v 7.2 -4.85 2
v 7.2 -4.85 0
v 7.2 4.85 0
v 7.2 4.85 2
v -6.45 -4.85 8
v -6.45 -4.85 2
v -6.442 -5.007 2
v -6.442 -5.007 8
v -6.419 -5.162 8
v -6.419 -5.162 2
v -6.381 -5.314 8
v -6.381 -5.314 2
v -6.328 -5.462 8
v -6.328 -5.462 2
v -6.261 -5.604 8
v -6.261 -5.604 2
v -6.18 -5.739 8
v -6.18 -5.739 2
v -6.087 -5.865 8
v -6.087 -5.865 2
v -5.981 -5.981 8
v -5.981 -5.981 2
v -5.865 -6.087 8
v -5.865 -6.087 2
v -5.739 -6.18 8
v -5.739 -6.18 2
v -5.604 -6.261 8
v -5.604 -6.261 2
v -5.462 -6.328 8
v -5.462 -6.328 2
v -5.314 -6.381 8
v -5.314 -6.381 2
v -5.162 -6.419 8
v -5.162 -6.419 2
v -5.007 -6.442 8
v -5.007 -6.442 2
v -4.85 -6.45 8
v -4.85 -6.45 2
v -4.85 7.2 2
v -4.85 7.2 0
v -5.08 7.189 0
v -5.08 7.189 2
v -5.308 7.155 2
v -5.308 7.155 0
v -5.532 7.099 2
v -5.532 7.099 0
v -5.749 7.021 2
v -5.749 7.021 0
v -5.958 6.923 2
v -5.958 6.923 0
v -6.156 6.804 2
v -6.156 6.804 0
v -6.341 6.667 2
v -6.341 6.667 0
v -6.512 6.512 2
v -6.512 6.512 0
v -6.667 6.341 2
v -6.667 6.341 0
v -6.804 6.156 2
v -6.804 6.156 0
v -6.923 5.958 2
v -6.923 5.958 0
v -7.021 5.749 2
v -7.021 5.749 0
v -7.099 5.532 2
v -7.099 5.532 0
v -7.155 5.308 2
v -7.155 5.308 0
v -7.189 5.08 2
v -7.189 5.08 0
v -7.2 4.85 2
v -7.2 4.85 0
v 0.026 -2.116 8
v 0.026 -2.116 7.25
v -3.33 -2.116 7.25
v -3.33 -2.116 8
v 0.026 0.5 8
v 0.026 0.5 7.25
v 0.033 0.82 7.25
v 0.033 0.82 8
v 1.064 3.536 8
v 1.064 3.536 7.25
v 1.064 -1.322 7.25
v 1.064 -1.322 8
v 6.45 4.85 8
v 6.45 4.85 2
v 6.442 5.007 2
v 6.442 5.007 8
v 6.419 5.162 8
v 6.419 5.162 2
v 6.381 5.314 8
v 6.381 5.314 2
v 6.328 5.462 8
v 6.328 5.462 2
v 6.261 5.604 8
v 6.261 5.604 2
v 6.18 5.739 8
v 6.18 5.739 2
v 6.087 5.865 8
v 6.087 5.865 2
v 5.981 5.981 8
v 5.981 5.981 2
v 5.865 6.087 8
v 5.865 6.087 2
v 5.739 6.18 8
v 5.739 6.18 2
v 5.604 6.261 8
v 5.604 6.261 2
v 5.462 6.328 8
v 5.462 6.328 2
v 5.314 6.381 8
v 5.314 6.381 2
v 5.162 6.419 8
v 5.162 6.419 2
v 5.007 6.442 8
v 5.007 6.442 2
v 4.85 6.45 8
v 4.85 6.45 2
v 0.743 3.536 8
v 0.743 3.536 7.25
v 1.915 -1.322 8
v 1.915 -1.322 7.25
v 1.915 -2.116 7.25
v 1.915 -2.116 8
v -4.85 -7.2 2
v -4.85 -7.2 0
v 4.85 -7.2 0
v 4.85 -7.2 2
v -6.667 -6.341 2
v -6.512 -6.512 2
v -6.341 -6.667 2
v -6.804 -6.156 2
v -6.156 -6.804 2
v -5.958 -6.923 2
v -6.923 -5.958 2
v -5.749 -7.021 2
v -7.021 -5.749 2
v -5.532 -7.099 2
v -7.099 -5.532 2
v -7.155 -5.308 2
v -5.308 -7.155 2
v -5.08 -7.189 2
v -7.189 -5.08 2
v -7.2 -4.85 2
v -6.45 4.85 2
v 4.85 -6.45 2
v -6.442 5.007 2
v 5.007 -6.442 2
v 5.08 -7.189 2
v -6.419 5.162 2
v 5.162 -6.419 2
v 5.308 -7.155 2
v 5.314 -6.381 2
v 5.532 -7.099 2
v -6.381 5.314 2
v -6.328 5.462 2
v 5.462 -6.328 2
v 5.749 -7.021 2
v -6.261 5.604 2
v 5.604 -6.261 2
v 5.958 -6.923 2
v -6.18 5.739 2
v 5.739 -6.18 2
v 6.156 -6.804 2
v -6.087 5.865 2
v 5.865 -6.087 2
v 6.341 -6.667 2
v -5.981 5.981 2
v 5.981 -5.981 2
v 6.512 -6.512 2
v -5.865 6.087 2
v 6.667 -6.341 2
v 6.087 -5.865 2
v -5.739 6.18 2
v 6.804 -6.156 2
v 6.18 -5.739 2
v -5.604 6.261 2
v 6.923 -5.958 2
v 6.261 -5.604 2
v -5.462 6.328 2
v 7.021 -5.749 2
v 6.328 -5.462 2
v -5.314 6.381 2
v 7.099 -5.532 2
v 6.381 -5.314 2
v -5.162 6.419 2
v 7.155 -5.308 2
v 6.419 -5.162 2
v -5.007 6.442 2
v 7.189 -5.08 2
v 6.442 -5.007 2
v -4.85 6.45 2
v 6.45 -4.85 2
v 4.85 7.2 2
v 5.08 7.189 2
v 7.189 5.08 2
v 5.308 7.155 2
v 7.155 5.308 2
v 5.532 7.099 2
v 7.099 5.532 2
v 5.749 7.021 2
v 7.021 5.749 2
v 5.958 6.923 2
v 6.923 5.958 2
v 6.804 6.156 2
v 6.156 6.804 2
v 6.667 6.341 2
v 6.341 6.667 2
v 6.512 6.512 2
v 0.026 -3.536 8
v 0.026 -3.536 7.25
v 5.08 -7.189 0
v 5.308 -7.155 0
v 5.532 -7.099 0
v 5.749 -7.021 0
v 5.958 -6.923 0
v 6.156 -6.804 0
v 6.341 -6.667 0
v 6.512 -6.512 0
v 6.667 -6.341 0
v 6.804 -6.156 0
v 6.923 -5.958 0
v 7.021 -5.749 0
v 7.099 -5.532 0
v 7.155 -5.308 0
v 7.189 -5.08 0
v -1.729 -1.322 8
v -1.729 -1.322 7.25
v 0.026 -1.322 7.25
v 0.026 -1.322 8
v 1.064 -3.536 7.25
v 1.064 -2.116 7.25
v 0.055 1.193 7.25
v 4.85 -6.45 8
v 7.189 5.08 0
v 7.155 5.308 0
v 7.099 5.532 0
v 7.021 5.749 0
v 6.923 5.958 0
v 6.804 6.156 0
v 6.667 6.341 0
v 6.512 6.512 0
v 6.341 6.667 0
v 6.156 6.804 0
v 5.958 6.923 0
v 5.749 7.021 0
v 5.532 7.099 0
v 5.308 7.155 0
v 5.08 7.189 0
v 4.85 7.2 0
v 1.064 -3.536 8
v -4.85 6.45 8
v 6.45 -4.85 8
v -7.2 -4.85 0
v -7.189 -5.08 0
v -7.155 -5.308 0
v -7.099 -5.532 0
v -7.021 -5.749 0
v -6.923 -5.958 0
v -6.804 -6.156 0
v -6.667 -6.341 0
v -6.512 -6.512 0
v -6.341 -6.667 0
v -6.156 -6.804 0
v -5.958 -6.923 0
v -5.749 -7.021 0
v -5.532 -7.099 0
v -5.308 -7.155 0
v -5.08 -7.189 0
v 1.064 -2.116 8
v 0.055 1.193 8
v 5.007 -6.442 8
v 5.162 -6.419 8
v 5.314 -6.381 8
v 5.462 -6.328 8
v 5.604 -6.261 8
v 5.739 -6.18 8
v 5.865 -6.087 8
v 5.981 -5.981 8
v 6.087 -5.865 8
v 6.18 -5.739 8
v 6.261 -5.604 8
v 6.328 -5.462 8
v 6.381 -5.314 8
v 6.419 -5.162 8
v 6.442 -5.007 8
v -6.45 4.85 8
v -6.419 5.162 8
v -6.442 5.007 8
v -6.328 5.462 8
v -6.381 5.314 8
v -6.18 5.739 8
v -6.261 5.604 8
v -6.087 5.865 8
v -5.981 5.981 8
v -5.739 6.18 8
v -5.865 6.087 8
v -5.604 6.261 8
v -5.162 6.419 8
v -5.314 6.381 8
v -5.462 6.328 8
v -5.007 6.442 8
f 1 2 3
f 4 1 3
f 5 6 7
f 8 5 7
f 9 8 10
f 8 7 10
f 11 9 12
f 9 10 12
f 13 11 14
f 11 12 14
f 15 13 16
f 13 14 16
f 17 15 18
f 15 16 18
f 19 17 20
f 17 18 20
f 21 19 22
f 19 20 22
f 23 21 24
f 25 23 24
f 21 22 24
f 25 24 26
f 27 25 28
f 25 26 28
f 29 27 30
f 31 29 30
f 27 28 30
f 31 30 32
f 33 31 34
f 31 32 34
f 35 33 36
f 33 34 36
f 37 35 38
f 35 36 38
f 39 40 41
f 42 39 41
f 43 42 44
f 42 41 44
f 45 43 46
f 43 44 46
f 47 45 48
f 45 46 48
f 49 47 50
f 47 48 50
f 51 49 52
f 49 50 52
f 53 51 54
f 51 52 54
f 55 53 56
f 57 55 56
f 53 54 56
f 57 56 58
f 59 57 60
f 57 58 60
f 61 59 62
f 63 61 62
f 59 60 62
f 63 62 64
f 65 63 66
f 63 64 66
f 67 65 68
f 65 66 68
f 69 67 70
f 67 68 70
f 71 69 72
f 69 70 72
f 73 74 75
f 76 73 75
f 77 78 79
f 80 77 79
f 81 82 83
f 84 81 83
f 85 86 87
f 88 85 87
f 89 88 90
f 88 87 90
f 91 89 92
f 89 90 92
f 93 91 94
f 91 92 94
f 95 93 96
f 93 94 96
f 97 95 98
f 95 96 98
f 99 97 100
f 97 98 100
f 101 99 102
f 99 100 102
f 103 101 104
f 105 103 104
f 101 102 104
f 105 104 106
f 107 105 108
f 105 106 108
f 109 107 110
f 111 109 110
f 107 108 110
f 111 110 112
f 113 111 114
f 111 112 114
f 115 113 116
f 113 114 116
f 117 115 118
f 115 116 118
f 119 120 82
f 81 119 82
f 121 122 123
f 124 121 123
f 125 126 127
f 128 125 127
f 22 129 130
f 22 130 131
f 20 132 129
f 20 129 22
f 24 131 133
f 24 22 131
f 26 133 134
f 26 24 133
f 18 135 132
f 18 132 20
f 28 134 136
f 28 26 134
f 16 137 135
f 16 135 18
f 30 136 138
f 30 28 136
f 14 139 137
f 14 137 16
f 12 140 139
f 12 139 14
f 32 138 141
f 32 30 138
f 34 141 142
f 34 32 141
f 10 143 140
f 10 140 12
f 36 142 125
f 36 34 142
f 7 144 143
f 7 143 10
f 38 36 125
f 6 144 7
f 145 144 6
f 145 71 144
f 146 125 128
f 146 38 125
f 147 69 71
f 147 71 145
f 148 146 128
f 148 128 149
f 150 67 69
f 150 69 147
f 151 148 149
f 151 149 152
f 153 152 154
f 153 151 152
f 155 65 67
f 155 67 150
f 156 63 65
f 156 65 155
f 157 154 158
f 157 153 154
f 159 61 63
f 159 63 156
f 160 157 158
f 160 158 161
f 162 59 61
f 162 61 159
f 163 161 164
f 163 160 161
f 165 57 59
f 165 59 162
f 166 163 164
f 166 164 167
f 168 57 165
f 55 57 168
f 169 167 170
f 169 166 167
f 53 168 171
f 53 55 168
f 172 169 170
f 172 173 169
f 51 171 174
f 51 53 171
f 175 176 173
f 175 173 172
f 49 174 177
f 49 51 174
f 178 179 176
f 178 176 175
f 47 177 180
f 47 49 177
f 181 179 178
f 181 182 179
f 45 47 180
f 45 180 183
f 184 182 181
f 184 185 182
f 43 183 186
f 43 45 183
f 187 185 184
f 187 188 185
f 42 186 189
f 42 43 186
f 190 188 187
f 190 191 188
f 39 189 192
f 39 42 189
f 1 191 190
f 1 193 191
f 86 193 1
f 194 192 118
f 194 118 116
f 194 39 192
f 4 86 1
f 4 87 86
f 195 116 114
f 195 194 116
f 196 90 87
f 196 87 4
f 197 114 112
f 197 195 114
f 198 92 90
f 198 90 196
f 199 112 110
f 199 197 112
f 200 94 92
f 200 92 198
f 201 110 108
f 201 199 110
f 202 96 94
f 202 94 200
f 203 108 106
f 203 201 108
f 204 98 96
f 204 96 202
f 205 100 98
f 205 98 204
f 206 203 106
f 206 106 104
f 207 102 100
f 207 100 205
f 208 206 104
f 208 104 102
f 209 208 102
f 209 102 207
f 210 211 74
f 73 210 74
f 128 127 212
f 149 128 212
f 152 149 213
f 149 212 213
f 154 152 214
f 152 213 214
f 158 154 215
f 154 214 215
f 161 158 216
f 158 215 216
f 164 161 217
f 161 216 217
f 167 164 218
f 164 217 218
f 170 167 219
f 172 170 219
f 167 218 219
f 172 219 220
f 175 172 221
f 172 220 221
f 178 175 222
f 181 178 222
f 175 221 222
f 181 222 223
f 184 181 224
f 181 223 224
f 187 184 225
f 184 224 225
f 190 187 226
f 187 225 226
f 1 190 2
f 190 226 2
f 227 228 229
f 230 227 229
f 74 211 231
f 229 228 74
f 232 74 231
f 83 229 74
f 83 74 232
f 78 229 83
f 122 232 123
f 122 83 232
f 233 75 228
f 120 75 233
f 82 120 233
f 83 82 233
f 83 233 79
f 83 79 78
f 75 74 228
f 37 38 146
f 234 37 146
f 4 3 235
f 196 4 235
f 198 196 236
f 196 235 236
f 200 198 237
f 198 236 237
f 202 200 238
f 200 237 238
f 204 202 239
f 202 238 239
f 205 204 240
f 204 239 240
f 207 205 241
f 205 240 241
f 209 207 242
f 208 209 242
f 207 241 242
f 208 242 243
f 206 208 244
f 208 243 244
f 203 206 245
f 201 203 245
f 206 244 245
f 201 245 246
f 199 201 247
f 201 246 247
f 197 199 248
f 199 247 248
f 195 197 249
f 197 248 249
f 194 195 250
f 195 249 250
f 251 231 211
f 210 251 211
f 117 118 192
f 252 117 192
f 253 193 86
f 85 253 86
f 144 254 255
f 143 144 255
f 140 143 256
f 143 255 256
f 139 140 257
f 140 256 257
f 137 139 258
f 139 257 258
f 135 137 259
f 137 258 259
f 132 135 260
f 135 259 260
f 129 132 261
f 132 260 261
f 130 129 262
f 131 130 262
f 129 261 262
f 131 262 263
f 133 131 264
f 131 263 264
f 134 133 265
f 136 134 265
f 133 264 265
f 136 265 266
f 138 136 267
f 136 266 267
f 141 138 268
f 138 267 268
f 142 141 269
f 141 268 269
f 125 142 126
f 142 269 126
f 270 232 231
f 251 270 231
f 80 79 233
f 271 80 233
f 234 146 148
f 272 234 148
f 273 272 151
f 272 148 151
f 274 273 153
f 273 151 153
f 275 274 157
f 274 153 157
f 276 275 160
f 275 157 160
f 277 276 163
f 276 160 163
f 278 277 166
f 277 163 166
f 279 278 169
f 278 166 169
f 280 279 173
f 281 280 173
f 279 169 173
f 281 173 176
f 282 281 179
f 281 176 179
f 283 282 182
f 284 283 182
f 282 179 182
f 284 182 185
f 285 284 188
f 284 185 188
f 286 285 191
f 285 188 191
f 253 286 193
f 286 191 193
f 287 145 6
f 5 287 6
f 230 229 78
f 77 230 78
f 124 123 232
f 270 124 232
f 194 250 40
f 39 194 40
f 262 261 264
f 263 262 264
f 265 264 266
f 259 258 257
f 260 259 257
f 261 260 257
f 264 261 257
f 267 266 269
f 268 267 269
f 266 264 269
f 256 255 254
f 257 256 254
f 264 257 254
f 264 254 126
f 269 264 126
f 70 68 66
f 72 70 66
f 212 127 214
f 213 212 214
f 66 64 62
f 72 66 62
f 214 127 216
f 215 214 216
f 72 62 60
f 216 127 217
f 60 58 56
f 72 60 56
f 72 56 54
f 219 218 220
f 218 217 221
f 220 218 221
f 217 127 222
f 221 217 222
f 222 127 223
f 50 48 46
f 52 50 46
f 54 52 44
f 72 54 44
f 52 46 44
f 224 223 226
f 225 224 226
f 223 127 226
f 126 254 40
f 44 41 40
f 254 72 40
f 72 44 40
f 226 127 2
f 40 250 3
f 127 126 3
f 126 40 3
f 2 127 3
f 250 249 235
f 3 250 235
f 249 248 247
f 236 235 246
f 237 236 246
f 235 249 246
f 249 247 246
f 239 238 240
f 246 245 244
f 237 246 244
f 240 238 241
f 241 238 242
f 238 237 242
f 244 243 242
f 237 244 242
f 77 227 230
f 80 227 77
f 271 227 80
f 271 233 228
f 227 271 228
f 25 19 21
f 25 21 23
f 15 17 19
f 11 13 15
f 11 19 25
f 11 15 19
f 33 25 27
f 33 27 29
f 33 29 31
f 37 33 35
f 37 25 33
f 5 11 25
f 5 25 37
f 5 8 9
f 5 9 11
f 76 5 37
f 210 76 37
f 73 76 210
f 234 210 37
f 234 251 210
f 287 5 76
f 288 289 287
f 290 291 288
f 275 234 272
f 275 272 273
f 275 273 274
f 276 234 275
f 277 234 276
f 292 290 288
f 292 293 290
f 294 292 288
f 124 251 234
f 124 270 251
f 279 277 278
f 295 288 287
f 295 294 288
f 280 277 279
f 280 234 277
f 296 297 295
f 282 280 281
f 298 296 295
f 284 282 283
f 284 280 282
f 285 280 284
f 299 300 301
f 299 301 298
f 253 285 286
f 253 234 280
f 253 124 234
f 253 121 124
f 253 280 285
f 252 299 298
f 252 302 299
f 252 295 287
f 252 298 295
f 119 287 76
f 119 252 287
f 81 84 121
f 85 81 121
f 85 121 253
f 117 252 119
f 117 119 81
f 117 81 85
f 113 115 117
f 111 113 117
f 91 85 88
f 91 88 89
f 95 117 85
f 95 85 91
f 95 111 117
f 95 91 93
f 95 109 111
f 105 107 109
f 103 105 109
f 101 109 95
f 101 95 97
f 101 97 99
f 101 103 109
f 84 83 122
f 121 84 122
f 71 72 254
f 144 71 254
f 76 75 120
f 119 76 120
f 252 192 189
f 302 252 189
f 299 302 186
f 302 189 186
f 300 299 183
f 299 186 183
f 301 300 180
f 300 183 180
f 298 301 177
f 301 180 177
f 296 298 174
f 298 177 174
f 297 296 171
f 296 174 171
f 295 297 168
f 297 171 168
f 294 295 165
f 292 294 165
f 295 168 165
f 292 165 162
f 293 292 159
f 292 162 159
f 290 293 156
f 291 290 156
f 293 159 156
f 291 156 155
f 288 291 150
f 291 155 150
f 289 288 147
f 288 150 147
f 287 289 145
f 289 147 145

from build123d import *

# Parameters (mm, degrees)
F1_DEPTH = 2
F2_DEPTH = 8
F3_DEPTH = 8
F4_DEPTH = 7.25


with BuildPart() as f1:
    # F0 (on Top) → F1 (new body)
    with BuildSketch(Plane.XY):
        with BuildLine():
            Line((4.85, 7.2), (-4.85, 7.2))
            ThreePointArc((-4.85, 7.2), (-6.5117009358, 6.5117009358), (-7.2, 4.85))
            Line((-7.2, 4.85), (-7.2, -4.85))
            ThreePointArc((-7.2, -4.85), (-6.5117009358, -6.5117009358), (-4.85, -7.2))
            Line((-4.85, -7.2), (4.85, -7.2))
            ThreePointArc((4.85, -7.2), (6.5117009358, -6.5117009358), (7.2, -4.85))
            Line((7.2, -4.85), (7.2, 4.85))
            ThreePointArc((7.2, 4.85), (6.5117009358, 6.5117009358), (4.85, 7.2))
        make_face()
        with BuildLine():
            ThreePointArc((6.45, -4.85), (5.9813708499, -5.9813708499), (4.85, -6.45))
            Line((4.85, -6.45), (-4.85, -6.45))
            ThreePointArc((-4.85, -6.45), (-5.9813708499, -5.9813708499), (-6.45, -4.85))
            Line((-6.45, -4.85), (-6.45, 4.85))
            ThreePointArc((-6.45, 4.85), (-5.9813708499, 5.9813708499), (-4.85, 6.45))
            Line((-4.85, 6.45), (4.85, 6.45))
            ThreePointArc((4.85, 6.45), (5.9813708499, 5.9813708499), (6.45, 4.85))
            Line((6.45, 4.85), (6.45, -4.85))
        make_face(mode=Mode.SUBTRACT)
    extrude(amount=F1_DEPTH)

    # F0 (on Top) → F2 (join)
    with BuildSketch(Plane.XY):
        with BuildLine():
            Line((-4.85, -6.45), (4.85, -6.45))
            ThreePointArc((4.85, -6.45), (5.9813708499, -5.9813708499), (6.45, -4.85))
            Line((6.45, -4.85), (6.45, 4.85))
            ThreePointArc((6.45, 4.85), (5.9813708499, 5.9813708499), (4.85, 6.45))
            Line((4.85, 6.45), (-4.85, 6.45))
            ThreePointArc((-4.85, 6.45), (-5.9813708499, 5.9813708499), (-6.45, 4.85))
            Line((-6.45, 4.85), (-6.45, -4.85))
            ThreePointArc((-6.45, -4.85), (-5.9813708499, -5.9813708499), (-4.85, -6.45))
        make_face()
        Polygon((1.063809, -3.535861), (0.026241, -3.535861), (0.026241, -2.115779), (-3.330316, -2.115779), (0.743454, 3.535861), (1.063809, 3.535861), (1.063809, -1.322063), (1.914902, -1.322063), (1.914902, -2.115779), (1.063809, -2.115779), align=None, mode=Mode.SUBTRACT)
    extrude(amount=F2_DEPTH)



with BuildPart() as f3:
    # F0 (on Top) → F3 (new body)
    with BuildSketch(Plane.XY):
        Polygon((0.033413, 0.820014), (0.05493, 1.192964), (-1.72854, -1.322063), (0.026241, -1.322063), (0.026241, 0.499658), align=None)
    extrude(amount=F3_DEPTH)


with BuildPart() as f1_1:
    add(f1.part)

    add(f3.part)  # F4 merges F3
    # F0 (on Top) → F4 (join)
    with BuildSketch(Plane.XY):
        Polygon((0.026241, -2.115779), (0.026241, -3.535861), (1.063809, -3.535861), (1.063809, -2.115779), (1.914902, -2.115779), (1.914902, -1.322063), (1.063809, -1.322063), (1.063809, 3.535861), (0.743454, 3.535861), (-3.330316, -2.115779), align=None)
        Polygon((-1.72854, -1.322063), (0.05493, 1.192964), (0.033413, 0.820014), (0.026241, 0.499658), (0.026241, -1.322063), align=None, mode=Mode.SUBTRACT)
    extrude(amount=F4_DEPTH)


solid = f1_1.part
